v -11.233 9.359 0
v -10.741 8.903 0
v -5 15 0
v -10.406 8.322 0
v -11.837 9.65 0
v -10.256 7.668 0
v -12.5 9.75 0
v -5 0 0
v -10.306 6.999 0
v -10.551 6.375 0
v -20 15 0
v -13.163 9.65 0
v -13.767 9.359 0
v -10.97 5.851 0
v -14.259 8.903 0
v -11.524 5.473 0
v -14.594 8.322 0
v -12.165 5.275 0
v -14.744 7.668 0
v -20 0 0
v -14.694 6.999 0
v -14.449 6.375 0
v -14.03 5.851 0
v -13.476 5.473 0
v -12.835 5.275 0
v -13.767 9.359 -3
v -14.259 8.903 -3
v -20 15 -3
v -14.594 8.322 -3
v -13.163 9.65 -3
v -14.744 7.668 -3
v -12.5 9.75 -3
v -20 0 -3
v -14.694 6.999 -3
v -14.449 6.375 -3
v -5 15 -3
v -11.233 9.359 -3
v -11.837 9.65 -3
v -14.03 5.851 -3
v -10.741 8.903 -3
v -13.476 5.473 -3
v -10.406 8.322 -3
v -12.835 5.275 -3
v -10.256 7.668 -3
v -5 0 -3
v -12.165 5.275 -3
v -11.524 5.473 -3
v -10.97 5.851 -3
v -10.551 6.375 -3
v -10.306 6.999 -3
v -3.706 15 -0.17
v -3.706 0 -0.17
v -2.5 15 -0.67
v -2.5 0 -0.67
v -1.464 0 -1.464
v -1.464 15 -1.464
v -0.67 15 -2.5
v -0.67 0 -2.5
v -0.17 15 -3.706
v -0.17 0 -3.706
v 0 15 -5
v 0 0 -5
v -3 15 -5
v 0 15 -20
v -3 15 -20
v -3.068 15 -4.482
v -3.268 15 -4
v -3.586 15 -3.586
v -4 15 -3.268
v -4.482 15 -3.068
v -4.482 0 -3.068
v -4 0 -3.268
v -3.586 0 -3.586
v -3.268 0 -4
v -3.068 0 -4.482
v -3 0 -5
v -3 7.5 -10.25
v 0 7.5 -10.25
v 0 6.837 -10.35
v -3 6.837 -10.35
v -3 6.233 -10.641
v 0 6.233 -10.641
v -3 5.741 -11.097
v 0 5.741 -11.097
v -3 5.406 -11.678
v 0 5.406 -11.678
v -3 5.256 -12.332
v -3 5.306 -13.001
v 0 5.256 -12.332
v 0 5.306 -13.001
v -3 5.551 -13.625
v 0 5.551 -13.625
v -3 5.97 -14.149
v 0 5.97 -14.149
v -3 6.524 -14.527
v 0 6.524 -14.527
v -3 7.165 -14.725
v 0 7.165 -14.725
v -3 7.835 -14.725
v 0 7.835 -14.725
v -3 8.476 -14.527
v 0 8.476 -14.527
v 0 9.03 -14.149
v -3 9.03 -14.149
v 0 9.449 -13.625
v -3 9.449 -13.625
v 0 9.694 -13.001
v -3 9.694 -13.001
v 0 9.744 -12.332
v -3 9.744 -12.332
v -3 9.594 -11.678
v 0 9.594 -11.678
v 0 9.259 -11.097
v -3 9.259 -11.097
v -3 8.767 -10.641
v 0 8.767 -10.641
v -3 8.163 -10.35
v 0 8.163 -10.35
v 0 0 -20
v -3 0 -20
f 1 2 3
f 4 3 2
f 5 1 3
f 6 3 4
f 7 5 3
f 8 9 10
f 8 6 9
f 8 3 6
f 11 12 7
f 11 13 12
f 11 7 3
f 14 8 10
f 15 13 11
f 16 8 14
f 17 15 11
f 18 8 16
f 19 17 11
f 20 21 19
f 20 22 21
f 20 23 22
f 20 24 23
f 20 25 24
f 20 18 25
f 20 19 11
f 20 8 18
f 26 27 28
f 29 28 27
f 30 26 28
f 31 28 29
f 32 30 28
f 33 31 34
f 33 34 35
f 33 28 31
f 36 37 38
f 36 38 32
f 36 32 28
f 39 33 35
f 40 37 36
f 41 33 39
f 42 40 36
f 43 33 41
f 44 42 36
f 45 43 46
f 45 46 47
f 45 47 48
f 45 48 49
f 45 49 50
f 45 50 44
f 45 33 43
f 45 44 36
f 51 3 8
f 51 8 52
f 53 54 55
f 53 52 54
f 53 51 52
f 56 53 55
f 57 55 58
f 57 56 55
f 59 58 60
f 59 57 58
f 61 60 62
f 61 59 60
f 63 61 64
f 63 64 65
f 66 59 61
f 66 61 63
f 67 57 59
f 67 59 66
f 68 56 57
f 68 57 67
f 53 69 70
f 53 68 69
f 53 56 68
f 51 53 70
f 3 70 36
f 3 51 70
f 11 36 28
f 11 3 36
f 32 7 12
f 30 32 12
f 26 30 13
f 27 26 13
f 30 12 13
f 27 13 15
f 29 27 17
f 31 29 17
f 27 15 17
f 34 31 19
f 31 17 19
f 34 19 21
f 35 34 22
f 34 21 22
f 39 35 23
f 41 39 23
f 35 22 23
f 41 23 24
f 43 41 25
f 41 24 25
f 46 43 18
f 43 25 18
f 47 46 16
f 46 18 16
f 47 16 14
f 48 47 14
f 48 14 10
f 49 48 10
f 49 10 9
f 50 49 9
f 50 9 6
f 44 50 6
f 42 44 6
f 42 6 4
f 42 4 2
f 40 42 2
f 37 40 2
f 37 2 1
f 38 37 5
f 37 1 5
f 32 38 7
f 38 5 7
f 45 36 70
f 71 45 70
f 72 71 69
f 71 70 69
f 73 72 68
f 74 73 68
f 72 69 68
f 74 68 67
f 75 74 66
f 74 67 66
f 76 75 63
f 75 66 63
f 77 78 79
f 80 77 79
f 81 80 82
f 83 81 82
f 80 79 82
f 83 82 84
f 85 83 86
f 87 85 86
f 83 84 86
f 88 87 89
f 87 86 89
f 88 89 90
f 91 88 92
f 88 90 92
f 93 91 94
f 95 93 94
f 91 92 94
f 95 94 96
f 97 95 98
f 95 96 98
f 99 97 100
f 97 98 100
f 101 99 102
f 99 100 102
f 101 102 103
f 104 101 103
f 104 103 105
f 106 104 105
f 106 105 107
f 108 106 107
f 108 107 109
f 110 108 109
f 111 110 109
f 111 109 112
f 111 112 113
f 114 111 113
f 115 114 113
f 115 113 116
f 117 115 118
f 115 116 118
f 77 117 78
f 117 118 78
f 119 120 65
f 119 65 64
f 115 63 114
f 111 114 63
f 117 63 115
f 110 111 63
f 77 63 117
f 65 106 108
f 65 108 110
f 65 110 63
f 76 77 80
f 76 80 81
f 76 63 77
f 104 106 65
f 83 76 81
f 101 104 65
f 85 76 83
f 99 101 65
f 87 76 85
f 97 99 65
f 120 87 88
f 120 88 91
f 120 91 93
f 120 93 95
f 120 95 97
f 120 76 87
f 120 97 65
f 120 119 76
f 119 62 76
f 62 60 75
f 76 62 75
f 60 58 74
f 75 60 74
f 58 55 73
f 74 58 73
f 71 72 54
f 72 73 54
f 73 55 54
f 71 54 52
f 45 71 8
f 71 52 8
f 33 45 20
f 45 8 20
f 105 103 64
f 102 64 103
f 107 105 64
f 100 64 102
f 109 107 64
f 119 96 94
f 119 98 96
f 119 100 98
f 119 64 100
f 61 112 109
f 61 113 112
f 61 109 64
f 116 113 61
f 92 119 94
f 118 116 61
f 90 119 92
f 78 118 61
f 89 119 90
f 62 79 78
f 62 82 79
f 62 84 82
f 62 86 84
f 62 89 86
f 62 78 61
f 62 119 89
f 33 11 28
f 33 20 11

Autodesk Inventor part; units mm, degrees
ref_plane "YZ Plane" through (0, 0, 0) normal (1, 0, 0) x (0, 1, 0)
ref_plane "XZ Plane" through (0, 0, 0) normal (0, 1, 0) x (-1, 0, 0)
ref_plane "XY Plane" through (0, 0, 0) normal (0, 0, 1) x (1, 0, 0)
sketch "Sketch1" plane through (0, 0, 0) normal (0, 1, 0) x (-1, 0, 0)
  line L0 (0, 0) -> (20, 0)
  line L1 (20, 0) -> (20, -3)
  line L2 (20, -3) -> (0, -3)
  line L3 (0, -3) -> (0, 0)
  line L4 (0, 0) -> (3, 0)
  line L5 (3, 0) -> (3, -20)
  line L6 (3, -20) -> (0, -20)
  line L7 (0, -20) -> (0, 0)
  dimension "d0" = 3
  dimension "d1" = 3
  dimension "d2" = 20
  dimension "d3" = 20
extrude "Extrusion1" add sketch "Sketch1" along normal blind 15
fillet "Fillet1" radius 2 1 edges at (-3, 7.5, -3)
fillet "Fillet2" radius 5 1 edges at (0, 7.5, 0)
sketch "Sketch2" plane through (-3, 0, -20) normal (-1, 0, 0) x (0, 0, 1)
  line L0 (0, 15) -> (15, 15) projected
  line L1 (0, 0) -> (15, 0) projected
  line L2 (0, 0) -> (0, 15) projected
  point P0 (20, 0)
  point P1 (7.5, 7.5)
  dimension "d9" = 7.5
  dimension "d29" = 7.5
hole "Hole1" at (-3, 7.5, -12.5) direction (1, 0, 0) diameter 4.5 end through all clearance for "Socket Head Cap Screw" size "M4" standard "Ansi Metric M Profile"
sketch "Sketch3" plane through (-20, 0, -3) normal (0, 0, -1) x (-1, 0, 0)
  line L0 (-15, 15) -> (0, 15) projected
  line L1 (-15, 0) -> (0, 0) projected
  line L2 (0, 0) -> (0, 15) projected
  point P0 (-20, 0)
  point P1 (-7.5, 7.5)
  dimension "d20" = 7.5
  dimension "d30" = 7.5
hole "Hole2" at (-12.5, 7.5, -3) direction (0, 0, 1) diameter 4.5 end through all clearance for "Socket Head Cap Screw" size "M4" standard "Ansi Metric M Profile"
equation "\"d1\" = d0"
equation "\"d3\" = d2"
properties part number "Pancake_Angle Bracket" material "Aluminum 6061"
